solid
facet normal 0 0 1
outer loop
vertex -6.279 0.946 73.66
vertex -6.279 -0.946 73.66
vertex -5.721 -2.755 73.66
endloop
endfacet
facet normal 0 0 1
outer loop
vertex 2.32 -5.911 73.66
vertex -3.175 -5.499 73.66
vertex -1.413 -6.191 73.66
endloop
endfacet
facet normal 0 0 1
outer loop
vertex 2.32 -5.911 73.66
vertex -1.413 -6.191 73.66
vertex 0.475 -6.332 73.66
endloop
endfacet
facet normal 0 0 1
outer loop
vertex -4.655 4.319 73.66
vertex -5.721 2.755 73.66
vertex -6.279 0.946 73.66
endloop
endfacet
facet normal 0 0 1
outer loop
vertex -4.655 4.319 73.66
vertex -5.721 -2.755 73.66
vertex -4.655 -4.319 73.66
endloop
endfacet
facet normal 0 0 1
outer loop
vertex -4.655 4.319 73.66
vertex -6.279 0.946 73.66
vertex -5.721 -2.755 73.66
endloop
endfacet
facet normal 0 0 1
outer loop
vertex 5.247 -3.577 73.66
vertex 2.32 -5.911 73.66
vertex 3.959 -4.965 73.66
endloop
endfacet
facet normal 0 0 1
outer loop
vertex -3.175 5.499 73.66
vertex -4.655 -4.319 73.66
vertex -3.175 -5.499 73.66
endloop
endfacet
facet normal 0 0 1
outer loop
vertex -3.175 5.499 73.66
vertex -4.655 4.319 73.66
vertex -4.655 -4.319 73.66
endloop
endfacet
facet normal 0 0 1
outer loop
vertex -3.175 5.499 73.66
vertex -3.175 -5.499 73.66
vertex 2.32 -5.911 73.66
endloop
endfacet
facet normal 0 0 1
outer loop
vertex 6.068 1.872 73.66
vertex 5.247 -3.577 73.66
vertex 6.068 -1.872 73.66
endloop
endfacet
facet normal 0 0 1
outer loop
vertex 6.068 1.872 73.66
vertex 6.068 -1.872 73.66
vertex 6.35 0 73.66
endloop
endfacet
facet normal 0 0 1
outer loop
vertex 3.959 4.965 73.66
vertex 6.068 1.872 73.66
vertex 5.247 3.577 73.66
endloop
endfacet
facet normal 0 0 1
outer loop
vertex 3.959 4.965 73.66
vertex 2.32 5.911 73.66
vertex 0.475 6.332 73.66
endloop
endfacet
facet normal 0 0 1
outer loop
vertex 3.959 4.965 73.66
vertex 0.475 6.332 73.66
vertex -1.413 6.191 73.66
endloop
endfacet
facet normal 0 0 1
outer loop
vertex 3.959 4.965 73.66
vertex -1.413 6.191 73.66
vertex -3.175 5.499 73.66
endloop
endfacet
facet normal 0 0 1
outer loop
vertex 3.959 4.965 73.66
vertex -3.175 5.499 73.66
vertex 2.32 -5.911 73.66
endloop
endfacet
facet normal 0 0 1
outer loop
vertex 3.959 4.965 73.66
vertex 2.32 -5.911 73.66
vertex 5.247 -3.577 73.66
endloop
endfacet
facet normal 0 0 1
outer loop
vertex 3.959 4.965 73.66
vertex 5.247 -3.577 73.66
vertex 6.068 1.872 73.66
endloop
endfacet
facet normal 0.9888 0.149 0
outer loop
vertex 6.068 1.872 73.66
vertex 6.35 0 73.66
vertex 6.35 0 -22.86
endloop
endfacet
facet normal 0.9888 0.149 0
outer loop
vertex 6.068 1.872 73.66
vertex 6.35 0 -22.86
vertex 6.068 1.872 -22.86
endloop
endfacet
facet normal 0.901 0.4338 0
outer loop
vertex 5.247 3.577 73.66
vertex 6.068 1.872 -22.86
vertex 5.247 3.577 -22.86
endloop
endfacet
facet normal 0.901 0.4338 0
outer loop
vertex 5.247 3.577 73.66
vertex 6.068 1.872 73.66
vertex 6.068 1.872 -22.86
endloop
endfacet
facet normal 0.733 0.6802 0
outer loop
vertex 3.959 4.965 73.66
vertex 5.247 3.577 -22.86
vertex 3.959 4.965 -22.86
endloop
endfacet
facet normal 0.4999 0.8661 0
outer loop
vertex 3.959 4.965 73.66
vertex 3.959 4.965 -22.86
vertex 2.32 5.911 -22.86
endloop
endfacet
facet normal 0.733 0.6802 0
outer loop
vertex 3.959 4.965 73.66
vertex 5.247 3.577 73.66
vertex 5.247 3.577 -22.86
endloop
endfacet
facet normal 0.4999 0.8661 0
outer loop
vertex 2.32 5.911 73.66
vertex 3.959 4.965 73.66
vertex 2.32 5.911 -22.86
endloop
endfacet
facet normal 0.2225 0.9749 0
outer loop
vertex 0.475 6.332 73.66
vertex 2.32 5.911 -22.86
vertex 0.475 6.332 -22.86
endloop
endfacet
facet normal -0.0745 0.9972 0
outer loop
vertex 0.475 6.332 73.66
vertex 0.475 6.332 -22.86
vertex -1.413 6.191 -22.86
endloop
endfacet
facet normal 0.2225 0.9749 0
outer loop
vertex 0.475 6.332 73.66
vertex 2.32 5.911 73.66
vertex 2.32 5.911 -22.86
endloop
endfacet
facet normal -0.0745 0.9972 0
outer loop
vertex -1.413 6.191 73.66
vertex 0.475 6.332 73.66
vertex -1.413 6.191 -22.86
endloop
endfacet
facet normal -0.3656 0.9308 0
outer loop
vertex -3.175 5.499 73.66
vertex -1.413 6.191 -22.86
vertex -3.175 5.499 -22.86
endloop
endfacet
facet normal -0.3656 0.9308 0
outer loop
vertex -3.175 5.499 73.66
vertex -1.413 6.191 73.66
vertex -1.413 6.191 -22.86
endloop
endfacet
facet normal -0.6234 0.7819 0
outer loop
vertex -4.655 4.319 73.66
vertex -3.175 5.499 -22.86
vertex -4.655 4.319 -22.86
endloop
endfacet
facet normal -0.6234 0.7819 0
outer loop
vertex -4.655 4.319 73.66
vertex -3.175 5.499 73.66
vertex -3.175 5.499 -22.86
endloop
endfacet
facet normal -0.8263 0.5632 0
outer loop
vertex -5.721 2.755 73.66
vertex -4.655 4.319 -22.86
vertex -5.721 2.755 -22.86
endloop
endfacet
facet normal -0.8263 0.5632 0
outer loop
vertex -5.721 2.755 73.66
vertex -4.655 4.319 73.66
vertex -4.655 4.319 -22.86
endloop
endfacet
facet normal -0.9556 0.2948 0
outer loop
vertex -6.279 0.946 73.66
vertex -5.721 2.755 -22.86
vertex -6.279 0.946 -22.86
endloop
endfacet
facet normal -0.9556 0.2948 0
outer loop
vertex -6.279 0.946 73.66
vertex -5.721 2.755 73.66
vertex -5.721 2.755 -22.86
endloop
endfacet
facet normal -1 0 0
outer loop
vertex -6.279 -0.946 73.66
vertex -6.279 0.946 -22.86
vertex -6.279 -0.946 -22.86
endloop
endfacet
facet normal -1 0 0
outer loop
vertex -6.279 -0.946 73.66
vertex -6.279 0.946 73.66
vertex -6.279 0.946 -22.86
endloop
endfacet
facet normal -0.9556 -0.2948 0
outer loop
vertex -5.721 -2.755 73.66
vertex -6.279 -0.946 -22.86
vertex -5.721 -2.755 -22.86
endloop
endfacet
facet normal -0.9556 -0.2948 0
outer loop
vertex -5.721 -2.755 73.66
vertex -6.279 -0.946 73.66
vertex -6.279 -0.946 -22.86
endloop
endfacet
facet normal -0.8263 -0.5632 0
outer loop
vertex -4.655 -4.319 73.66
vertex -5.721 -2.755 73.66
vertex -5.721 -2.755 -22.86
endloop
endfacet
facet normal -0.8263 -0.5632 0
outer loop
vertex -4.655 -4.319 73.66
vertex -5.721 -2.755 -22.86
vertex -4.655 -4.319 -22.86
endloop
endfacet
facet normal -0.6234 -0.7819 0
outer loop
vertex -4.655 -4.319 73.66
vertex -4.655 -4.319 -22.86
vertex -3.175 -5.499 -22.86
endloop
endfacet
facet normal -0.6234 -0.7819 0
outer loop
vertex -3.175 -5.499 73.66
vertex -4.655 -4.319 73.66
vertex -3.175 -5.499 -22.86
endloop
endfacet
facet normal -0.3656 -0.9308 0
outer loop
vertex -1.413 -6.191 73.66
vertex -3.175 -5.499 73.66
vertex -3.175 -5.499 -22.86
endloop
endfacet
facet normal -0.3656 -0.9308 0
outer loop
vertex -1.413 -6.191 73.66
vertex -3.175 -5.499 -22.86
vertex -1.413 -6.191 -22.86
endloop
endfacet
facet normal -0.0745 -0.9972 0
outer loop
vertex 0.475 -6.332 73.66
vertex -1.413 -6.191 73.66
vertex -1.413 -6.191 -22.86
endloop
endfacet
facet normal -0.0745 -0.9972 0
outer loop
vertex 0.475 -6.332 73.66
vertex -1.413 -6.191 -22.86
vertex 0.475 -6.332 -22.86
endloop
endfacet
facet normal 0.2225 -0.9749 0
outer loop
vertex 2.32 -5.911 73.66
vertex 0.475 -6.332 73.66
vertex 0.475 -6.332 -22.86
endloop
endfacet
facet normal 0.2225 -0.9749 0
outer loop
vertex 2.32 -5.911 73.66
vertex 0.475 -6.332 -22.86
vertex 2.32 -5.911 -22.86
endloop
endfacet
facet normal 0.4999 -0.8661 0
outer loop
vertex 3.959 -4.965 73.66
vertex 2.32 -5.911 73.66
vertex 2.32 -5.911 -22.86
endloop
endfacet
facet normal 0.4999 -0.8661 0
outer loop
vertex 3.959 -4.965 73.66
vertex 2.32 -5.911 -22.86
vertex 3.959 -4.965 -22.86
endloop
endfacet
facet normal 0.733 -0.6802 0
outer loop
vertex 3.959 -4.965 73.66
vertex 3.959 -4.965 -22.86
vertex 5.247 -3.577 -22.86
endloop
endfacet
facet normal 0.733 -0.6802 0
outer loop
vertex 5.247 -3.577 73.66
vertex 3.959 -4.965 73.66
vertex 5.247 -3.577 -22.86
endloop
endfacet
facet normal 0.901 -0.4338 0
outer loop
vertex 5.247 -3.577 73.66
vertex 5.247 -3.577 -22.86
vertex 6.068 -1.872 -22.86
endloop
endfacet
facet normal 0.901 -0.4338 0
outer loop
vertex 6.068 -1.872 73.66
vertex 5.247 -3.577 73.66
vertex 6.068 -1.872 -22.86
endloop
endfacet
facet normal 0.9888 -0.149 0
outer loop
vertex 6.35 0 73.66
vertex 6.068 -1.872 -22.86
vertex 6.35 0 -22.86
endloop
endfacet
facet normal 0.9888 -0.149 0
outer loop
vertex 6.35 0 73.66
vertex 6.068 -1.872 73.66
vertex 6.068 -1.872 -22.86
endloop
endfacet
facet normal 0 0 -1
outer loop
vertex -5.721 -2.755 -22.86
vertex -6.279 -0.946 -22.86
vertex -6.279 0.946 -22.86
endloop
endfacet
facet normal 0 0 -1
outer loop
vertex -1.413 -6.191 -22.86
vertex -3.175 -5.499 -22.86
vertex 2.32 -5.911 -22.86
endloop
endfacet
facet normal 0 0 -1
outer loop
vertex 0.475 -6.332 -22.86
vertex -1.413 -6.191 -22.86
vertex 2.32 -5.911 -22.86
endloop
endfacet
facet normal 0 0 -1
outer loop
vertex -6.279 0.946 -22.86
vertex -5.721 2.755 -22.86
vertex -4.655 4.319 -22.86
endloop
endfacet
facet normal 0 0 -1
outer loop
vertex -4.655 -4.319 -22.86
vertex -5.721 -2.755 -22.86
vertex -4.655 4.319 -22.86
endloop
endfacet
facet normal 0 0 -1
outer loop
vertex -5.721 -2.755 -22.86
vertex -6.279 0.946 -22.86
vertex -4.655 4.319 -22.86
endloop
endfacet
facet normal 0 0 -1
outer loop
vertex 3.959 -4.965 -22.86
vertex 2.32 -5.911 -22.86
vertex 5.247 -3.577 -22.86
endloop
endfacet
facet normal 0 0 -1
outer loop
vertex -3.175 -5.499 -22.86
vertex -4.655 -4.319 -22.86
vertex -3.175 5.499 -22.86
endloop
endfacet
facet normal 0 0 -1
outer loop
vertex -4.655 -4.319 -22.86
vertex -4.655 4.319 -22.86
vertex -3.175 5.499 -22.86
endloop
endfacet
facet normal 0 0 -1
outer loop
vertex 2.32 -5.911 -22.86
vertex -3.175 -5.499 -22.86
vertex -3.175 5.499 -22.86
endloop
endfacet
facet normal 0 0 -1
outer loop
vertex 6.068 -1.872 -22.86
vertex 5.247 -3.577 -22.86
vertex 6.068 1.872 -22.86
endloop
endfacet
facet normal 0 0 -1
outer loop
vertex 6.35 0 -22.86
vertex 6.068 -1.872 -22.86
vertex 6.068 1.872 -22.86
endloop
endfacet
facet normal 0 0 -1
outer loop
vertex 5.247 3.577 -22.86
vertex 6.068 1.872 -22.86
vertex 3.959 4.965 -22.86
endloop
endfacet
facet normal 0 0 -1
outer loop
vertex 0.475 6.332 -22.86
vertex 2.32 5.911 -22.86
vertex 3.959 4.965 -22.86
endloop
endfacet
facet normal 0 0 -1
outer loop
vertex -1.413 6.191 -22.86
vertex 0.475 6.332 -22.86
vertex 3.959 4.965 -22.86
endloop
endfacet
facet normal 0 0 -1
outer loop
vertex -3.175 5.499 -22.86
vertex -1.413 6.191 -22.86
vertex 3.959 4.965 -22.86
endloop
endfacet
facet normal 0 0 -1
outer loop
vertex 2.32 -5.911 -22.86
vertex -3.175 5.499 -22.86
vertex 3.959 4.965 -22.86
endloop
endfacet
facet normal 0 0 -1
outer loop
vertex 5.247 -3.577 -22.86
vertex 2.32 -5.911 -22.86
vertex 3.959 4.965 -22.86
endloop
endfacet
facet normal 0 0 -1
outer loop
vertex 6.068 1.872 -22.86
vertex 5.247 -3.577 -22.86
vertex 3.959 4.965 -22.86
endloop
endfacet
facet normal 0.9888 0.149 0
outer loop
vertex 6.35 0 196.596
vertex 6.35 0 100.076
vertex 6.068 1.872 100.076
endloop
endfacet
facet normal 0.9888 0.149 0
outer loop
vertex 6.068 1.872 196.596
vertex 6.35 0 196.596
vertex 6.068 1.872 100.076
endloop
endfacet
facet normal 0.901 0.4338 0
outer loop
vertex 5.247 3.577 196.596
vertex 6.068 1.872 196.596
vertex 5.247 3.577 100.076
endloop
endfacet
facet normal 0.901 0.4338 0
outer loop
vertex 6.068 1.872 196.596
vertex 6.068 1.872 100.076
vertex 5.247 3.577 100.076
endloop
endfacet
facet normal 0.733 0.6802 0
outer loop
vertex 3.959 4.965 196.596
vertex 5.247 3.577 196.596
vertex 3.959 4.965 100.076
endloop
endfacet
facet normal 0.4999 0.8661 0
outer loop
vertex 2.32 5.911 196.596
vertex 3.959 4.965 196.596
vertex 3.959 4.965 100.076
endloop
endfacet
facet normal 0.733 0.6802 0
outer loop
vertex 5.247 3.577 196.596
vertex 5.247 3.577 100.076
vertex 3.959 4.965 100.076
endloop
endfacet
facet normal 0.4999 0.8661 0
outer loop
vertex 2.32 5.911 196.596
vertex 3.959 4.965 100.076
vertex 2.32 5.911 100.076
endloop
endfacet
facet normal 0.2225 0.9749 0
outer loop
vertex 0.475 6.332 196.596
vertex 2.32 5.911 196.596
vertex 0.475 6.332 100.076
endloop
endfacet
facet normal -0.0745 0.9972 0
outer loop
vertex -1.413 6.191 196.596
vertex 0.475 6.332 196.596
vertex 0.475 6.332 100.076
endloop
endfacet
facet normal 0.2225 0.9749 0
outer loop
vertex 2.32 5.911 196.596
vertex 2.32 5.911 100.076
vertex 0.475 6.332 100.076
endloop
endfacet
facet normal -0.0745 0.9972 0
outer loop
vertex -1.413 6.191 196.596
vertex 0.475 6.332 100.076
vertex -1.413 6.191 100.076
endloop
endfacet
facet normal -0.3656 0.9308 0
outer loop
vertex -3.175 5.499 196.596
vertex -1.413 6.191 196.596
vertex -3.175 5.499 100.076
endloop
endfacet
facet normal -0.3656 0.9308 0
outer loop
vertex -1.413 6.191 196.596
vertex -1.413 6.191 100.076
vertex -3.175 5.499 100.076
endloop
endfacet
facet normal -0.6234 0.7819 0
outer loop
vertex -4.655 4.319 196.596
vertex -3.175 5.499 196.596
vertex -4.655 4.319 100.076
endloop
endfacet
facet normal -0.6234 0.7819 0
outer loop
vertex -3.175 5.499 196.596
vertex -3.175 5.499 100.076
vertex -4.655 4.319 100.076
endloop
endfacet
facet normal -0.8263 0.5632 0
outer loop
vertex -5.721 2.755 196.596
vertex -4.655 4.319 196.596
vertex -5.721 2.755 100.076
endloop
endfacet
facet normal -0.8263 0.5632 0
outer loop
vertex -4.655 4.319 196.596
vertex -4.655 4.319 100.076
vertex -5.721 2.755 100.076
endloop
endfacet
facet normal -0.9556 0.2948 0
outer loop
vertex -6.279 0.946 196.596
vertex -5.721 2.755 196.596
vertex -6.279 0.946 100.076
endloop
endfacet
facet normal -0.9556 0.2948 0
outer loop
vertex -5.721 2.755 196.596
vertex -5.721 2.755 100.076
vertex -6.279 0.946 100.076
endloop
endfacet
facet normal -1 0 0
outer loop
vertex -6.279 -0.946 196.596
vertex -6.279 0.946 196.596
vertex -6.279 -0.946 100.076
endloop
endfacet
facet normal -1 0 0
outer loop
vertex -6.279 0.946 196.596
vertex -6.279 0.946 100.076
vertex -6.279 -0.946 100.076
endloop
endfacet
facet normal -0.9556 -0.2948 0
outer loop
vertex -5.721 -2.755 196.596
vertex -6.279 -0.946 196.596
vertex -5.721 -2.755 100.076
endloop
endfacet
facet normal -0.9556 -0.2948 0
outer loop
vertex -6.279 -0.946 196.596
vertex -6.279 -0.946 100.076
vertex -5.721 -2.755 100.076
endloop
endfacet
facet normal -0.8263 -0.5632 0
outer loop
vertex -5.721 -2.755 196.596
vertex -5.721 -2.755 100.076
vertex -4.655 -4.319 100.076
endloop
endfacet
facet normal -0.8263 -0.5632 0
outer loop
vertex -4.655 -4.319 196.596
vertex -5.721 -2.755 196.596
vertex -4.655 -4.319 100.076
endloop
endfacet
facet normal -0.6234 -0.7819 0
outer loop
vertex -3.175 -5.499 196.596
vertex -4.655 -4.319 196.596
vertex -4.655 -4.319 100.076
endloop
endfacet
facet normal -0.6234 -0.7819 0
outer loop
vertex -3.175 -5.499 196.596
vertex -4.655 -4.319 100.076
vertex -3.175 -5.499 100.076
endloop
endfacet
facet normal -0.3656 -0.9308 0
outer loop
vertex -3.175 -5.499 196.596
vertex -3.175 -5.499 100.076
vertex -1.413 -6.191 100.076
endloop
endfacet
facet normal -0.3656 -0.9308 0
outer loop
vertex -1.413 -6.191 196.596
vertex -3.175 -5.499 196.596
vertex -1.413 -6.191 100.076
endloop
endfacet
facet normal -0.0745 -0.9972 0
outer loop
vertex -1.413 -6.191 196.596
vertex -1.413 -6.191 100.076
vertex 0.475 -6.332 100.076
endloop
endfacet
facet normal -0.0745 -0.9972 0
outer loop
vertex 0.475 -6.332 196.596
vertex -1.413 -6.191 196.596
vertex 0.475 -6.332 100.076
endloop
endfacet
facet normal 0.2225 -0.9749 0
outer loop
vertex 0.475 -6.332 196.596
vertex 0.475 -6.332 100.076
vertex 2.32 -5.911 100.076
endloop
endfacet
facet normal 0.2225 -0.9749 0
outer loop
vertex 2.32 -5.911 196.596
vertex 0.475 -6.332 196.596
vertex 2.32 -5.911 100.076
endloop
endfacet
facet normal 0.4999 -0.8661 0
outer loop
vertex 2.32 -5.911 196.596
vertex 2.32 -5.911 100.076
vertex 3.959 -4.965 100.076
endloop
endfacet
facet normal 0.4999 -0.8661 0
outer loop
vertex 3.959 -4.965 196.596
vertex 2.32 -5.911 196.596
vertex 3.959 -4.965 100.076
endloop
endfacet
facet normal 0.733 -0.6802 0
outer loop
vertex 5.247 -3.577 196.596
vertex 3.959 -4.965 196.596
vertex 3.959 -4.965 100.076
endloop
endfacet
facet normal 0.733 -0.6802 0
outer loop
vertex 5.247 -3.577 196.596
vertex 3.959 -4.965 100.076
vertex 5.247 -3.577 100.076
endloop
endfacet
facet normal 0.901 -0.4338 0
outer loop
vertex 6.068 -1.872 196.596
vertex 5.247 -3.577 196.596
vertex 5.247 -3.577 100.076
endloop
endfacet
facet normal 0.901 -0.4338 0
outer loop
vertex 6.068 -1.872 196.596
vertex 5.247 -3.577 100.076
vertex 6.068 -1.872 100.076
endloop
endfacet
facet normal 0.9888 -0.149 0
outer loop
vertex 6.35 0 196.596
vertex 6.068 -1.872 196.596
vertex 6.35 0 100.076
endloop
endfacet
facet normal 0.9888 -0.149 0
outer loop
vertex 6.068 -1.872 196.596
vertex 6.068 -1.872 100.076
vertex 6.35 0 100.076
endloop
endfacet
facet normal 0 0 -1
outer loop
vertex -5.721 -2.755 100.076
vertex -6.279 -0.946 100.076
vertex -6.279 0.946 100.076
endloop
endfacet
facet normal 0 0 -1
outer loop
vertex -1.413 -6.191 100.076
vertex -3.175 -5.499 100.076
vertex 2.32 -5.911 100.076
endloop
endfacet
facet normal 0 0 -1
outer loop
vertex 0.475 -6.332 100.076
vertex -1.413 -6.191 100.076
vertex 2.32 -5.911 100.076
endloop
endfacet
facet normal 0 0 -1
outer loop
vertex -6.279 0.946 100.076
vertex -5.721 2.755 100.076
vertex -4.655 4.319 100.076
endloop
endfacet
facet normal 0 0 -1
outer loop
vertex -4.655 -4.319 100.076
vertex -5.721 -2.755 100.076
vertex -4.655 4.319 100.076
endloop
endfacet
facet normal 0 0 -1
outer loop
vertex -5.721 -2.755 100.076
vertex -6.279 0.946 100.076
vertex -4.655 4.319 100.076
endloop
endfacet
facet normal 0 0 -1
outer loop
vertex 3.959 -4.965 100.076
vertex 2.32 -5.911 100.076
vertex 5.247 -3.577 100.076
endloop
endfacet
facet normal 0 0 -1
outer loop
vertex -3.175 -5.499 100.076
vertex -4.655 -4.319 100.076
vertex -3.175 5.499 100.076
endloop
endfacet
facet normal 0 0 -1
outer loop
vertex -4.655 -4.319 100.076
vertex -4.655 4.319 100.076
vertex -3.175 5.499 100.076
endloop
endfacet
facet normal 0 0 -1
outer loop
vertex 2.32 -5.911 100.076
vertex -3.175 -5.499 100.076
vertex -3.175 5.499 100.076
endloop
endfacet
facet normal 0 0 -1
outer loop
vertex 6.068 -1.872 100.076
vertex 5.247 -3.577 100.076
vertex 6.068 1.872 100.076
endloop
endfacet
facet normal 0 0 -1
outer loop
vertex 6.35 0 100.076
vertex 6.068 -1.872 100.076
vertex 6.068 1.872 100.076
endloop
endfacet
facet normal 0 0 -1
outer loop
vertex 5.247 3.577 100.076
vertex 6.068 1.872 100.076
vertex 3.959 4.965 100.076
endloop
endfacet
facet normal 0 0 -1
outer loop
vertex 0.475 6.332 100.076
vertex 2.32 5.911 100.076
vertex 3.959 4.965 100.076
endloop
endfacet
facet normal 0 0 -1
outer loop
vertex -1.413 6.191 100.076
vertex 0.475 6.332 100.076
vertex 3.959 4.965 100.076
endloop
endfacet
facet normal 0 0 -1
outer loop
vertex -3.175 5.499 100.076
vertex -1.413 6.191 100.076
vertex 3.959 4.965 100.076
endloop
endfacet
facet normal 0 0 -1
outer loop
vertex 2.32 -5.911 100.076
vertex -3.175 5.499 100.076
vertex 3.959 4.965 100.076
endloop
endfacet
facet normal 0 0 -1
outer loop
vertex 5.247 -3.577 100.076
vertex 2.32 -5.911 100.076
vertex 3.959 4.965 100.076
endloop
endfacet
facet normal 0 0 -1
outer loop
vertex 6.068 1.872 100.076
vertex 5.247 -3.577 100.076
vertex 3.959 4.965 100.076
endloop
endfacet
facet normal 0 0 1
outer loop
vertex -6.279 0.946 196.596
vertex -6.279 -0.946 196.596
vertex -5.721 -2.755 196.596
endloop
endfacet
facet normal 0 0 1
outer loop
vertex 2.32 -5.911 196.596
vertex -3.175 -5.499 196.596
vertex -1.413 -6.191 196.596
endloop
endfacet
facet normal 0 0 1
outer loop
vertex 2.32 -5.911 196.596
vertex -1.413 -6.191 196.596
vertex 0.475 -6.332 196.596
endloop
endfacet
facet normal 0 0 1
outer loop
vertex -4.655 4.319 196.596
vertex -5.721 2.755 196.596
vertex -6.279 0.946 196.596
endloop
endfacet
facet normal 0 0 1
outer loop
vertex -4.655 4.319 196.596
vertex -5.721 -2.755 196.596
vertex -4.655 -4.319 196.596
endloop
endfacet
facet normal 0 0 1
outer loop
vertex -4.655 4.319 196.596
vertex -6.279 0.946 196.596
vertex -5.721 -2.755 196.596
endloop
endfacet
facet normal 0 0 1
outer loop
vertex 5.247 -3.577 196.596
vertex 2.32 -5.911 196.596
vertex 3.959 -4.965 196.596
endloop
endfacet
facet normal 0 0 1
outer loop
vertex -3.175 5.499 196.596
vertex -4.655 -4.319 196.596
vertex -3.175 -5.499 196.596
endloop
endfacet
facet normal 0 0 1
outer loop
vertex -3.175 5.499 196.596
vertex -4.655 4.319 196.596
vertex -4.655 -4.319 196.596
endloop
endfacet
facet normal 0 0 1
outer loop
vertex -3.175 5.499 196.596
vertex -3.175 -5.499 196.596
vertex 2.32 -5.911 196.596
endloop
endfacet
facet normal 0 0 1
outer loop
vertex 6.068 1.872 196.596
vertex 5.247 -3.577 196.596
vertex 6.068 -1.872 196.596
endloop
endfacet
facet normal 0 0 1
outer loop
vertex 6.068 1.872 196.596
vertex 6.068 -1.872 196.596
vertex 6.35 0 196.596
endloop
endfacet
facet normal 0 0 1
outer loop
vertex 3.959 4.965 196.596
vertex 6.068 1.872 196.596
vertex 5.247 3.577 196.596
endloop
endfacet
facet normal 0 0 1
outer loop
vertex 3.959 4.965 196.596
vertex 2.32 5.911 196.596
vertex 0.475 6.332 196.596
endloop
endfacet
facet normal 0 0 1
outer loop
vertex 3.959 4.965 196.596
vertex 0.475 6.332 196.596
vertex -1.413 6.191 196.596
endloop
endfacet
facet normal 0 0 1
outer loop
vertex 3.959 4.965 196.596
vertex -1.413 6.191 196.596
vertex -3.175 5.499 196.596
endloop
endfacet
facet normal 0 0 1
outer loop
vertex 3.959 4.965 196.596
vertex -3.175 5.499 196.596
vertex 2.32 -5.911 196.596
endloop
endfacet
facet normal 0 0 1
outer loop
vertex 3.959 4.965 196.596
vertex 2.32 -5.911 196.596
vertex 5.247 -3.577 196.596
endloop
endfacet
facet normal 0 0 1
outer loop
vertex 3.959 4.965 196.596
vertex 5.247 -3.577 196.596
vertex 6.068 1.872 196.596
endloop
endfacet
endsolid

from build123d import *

# Parameters (mm, degrees)
BOSS_EXTRUDE1_START     = -96.52
BOSS_EXTRUDE1_OUTLINE_R = 6.35
BOSS_EXTRUDE1_DEPTH     = 96.52
SKETCH3_R               = 6.35
BOSS_EXTRUDE2_DEPTH     = 96.52


# Read off the part's stored shape, not the designer's step: Boss-Extrude1
with BuildPart() as part:
    # Boss-Extrude1 outline → Boss-Extrude1 (new body)
    with BuildSketch(Plane.XY.offset(196.596).offset(BOSS_EXTRUDE1_START)):
        Circle(BOSS_EXTRUDE1_OUTLINE_R)
    extrude(amount=BOSS_EXTRUDE1_DEPTH)


with BuildPart() as body_2:
    # Sketch3 → Boss-Extrude2 (new body)
    with BuildSketch(Plane.XY.offset(73.66)):
        Circle(SKETCH3_R)
    extrude(amount=-BOSS_EXTRUDE2_DEPTH)


solid = Compound([part.part, body_2.part])
